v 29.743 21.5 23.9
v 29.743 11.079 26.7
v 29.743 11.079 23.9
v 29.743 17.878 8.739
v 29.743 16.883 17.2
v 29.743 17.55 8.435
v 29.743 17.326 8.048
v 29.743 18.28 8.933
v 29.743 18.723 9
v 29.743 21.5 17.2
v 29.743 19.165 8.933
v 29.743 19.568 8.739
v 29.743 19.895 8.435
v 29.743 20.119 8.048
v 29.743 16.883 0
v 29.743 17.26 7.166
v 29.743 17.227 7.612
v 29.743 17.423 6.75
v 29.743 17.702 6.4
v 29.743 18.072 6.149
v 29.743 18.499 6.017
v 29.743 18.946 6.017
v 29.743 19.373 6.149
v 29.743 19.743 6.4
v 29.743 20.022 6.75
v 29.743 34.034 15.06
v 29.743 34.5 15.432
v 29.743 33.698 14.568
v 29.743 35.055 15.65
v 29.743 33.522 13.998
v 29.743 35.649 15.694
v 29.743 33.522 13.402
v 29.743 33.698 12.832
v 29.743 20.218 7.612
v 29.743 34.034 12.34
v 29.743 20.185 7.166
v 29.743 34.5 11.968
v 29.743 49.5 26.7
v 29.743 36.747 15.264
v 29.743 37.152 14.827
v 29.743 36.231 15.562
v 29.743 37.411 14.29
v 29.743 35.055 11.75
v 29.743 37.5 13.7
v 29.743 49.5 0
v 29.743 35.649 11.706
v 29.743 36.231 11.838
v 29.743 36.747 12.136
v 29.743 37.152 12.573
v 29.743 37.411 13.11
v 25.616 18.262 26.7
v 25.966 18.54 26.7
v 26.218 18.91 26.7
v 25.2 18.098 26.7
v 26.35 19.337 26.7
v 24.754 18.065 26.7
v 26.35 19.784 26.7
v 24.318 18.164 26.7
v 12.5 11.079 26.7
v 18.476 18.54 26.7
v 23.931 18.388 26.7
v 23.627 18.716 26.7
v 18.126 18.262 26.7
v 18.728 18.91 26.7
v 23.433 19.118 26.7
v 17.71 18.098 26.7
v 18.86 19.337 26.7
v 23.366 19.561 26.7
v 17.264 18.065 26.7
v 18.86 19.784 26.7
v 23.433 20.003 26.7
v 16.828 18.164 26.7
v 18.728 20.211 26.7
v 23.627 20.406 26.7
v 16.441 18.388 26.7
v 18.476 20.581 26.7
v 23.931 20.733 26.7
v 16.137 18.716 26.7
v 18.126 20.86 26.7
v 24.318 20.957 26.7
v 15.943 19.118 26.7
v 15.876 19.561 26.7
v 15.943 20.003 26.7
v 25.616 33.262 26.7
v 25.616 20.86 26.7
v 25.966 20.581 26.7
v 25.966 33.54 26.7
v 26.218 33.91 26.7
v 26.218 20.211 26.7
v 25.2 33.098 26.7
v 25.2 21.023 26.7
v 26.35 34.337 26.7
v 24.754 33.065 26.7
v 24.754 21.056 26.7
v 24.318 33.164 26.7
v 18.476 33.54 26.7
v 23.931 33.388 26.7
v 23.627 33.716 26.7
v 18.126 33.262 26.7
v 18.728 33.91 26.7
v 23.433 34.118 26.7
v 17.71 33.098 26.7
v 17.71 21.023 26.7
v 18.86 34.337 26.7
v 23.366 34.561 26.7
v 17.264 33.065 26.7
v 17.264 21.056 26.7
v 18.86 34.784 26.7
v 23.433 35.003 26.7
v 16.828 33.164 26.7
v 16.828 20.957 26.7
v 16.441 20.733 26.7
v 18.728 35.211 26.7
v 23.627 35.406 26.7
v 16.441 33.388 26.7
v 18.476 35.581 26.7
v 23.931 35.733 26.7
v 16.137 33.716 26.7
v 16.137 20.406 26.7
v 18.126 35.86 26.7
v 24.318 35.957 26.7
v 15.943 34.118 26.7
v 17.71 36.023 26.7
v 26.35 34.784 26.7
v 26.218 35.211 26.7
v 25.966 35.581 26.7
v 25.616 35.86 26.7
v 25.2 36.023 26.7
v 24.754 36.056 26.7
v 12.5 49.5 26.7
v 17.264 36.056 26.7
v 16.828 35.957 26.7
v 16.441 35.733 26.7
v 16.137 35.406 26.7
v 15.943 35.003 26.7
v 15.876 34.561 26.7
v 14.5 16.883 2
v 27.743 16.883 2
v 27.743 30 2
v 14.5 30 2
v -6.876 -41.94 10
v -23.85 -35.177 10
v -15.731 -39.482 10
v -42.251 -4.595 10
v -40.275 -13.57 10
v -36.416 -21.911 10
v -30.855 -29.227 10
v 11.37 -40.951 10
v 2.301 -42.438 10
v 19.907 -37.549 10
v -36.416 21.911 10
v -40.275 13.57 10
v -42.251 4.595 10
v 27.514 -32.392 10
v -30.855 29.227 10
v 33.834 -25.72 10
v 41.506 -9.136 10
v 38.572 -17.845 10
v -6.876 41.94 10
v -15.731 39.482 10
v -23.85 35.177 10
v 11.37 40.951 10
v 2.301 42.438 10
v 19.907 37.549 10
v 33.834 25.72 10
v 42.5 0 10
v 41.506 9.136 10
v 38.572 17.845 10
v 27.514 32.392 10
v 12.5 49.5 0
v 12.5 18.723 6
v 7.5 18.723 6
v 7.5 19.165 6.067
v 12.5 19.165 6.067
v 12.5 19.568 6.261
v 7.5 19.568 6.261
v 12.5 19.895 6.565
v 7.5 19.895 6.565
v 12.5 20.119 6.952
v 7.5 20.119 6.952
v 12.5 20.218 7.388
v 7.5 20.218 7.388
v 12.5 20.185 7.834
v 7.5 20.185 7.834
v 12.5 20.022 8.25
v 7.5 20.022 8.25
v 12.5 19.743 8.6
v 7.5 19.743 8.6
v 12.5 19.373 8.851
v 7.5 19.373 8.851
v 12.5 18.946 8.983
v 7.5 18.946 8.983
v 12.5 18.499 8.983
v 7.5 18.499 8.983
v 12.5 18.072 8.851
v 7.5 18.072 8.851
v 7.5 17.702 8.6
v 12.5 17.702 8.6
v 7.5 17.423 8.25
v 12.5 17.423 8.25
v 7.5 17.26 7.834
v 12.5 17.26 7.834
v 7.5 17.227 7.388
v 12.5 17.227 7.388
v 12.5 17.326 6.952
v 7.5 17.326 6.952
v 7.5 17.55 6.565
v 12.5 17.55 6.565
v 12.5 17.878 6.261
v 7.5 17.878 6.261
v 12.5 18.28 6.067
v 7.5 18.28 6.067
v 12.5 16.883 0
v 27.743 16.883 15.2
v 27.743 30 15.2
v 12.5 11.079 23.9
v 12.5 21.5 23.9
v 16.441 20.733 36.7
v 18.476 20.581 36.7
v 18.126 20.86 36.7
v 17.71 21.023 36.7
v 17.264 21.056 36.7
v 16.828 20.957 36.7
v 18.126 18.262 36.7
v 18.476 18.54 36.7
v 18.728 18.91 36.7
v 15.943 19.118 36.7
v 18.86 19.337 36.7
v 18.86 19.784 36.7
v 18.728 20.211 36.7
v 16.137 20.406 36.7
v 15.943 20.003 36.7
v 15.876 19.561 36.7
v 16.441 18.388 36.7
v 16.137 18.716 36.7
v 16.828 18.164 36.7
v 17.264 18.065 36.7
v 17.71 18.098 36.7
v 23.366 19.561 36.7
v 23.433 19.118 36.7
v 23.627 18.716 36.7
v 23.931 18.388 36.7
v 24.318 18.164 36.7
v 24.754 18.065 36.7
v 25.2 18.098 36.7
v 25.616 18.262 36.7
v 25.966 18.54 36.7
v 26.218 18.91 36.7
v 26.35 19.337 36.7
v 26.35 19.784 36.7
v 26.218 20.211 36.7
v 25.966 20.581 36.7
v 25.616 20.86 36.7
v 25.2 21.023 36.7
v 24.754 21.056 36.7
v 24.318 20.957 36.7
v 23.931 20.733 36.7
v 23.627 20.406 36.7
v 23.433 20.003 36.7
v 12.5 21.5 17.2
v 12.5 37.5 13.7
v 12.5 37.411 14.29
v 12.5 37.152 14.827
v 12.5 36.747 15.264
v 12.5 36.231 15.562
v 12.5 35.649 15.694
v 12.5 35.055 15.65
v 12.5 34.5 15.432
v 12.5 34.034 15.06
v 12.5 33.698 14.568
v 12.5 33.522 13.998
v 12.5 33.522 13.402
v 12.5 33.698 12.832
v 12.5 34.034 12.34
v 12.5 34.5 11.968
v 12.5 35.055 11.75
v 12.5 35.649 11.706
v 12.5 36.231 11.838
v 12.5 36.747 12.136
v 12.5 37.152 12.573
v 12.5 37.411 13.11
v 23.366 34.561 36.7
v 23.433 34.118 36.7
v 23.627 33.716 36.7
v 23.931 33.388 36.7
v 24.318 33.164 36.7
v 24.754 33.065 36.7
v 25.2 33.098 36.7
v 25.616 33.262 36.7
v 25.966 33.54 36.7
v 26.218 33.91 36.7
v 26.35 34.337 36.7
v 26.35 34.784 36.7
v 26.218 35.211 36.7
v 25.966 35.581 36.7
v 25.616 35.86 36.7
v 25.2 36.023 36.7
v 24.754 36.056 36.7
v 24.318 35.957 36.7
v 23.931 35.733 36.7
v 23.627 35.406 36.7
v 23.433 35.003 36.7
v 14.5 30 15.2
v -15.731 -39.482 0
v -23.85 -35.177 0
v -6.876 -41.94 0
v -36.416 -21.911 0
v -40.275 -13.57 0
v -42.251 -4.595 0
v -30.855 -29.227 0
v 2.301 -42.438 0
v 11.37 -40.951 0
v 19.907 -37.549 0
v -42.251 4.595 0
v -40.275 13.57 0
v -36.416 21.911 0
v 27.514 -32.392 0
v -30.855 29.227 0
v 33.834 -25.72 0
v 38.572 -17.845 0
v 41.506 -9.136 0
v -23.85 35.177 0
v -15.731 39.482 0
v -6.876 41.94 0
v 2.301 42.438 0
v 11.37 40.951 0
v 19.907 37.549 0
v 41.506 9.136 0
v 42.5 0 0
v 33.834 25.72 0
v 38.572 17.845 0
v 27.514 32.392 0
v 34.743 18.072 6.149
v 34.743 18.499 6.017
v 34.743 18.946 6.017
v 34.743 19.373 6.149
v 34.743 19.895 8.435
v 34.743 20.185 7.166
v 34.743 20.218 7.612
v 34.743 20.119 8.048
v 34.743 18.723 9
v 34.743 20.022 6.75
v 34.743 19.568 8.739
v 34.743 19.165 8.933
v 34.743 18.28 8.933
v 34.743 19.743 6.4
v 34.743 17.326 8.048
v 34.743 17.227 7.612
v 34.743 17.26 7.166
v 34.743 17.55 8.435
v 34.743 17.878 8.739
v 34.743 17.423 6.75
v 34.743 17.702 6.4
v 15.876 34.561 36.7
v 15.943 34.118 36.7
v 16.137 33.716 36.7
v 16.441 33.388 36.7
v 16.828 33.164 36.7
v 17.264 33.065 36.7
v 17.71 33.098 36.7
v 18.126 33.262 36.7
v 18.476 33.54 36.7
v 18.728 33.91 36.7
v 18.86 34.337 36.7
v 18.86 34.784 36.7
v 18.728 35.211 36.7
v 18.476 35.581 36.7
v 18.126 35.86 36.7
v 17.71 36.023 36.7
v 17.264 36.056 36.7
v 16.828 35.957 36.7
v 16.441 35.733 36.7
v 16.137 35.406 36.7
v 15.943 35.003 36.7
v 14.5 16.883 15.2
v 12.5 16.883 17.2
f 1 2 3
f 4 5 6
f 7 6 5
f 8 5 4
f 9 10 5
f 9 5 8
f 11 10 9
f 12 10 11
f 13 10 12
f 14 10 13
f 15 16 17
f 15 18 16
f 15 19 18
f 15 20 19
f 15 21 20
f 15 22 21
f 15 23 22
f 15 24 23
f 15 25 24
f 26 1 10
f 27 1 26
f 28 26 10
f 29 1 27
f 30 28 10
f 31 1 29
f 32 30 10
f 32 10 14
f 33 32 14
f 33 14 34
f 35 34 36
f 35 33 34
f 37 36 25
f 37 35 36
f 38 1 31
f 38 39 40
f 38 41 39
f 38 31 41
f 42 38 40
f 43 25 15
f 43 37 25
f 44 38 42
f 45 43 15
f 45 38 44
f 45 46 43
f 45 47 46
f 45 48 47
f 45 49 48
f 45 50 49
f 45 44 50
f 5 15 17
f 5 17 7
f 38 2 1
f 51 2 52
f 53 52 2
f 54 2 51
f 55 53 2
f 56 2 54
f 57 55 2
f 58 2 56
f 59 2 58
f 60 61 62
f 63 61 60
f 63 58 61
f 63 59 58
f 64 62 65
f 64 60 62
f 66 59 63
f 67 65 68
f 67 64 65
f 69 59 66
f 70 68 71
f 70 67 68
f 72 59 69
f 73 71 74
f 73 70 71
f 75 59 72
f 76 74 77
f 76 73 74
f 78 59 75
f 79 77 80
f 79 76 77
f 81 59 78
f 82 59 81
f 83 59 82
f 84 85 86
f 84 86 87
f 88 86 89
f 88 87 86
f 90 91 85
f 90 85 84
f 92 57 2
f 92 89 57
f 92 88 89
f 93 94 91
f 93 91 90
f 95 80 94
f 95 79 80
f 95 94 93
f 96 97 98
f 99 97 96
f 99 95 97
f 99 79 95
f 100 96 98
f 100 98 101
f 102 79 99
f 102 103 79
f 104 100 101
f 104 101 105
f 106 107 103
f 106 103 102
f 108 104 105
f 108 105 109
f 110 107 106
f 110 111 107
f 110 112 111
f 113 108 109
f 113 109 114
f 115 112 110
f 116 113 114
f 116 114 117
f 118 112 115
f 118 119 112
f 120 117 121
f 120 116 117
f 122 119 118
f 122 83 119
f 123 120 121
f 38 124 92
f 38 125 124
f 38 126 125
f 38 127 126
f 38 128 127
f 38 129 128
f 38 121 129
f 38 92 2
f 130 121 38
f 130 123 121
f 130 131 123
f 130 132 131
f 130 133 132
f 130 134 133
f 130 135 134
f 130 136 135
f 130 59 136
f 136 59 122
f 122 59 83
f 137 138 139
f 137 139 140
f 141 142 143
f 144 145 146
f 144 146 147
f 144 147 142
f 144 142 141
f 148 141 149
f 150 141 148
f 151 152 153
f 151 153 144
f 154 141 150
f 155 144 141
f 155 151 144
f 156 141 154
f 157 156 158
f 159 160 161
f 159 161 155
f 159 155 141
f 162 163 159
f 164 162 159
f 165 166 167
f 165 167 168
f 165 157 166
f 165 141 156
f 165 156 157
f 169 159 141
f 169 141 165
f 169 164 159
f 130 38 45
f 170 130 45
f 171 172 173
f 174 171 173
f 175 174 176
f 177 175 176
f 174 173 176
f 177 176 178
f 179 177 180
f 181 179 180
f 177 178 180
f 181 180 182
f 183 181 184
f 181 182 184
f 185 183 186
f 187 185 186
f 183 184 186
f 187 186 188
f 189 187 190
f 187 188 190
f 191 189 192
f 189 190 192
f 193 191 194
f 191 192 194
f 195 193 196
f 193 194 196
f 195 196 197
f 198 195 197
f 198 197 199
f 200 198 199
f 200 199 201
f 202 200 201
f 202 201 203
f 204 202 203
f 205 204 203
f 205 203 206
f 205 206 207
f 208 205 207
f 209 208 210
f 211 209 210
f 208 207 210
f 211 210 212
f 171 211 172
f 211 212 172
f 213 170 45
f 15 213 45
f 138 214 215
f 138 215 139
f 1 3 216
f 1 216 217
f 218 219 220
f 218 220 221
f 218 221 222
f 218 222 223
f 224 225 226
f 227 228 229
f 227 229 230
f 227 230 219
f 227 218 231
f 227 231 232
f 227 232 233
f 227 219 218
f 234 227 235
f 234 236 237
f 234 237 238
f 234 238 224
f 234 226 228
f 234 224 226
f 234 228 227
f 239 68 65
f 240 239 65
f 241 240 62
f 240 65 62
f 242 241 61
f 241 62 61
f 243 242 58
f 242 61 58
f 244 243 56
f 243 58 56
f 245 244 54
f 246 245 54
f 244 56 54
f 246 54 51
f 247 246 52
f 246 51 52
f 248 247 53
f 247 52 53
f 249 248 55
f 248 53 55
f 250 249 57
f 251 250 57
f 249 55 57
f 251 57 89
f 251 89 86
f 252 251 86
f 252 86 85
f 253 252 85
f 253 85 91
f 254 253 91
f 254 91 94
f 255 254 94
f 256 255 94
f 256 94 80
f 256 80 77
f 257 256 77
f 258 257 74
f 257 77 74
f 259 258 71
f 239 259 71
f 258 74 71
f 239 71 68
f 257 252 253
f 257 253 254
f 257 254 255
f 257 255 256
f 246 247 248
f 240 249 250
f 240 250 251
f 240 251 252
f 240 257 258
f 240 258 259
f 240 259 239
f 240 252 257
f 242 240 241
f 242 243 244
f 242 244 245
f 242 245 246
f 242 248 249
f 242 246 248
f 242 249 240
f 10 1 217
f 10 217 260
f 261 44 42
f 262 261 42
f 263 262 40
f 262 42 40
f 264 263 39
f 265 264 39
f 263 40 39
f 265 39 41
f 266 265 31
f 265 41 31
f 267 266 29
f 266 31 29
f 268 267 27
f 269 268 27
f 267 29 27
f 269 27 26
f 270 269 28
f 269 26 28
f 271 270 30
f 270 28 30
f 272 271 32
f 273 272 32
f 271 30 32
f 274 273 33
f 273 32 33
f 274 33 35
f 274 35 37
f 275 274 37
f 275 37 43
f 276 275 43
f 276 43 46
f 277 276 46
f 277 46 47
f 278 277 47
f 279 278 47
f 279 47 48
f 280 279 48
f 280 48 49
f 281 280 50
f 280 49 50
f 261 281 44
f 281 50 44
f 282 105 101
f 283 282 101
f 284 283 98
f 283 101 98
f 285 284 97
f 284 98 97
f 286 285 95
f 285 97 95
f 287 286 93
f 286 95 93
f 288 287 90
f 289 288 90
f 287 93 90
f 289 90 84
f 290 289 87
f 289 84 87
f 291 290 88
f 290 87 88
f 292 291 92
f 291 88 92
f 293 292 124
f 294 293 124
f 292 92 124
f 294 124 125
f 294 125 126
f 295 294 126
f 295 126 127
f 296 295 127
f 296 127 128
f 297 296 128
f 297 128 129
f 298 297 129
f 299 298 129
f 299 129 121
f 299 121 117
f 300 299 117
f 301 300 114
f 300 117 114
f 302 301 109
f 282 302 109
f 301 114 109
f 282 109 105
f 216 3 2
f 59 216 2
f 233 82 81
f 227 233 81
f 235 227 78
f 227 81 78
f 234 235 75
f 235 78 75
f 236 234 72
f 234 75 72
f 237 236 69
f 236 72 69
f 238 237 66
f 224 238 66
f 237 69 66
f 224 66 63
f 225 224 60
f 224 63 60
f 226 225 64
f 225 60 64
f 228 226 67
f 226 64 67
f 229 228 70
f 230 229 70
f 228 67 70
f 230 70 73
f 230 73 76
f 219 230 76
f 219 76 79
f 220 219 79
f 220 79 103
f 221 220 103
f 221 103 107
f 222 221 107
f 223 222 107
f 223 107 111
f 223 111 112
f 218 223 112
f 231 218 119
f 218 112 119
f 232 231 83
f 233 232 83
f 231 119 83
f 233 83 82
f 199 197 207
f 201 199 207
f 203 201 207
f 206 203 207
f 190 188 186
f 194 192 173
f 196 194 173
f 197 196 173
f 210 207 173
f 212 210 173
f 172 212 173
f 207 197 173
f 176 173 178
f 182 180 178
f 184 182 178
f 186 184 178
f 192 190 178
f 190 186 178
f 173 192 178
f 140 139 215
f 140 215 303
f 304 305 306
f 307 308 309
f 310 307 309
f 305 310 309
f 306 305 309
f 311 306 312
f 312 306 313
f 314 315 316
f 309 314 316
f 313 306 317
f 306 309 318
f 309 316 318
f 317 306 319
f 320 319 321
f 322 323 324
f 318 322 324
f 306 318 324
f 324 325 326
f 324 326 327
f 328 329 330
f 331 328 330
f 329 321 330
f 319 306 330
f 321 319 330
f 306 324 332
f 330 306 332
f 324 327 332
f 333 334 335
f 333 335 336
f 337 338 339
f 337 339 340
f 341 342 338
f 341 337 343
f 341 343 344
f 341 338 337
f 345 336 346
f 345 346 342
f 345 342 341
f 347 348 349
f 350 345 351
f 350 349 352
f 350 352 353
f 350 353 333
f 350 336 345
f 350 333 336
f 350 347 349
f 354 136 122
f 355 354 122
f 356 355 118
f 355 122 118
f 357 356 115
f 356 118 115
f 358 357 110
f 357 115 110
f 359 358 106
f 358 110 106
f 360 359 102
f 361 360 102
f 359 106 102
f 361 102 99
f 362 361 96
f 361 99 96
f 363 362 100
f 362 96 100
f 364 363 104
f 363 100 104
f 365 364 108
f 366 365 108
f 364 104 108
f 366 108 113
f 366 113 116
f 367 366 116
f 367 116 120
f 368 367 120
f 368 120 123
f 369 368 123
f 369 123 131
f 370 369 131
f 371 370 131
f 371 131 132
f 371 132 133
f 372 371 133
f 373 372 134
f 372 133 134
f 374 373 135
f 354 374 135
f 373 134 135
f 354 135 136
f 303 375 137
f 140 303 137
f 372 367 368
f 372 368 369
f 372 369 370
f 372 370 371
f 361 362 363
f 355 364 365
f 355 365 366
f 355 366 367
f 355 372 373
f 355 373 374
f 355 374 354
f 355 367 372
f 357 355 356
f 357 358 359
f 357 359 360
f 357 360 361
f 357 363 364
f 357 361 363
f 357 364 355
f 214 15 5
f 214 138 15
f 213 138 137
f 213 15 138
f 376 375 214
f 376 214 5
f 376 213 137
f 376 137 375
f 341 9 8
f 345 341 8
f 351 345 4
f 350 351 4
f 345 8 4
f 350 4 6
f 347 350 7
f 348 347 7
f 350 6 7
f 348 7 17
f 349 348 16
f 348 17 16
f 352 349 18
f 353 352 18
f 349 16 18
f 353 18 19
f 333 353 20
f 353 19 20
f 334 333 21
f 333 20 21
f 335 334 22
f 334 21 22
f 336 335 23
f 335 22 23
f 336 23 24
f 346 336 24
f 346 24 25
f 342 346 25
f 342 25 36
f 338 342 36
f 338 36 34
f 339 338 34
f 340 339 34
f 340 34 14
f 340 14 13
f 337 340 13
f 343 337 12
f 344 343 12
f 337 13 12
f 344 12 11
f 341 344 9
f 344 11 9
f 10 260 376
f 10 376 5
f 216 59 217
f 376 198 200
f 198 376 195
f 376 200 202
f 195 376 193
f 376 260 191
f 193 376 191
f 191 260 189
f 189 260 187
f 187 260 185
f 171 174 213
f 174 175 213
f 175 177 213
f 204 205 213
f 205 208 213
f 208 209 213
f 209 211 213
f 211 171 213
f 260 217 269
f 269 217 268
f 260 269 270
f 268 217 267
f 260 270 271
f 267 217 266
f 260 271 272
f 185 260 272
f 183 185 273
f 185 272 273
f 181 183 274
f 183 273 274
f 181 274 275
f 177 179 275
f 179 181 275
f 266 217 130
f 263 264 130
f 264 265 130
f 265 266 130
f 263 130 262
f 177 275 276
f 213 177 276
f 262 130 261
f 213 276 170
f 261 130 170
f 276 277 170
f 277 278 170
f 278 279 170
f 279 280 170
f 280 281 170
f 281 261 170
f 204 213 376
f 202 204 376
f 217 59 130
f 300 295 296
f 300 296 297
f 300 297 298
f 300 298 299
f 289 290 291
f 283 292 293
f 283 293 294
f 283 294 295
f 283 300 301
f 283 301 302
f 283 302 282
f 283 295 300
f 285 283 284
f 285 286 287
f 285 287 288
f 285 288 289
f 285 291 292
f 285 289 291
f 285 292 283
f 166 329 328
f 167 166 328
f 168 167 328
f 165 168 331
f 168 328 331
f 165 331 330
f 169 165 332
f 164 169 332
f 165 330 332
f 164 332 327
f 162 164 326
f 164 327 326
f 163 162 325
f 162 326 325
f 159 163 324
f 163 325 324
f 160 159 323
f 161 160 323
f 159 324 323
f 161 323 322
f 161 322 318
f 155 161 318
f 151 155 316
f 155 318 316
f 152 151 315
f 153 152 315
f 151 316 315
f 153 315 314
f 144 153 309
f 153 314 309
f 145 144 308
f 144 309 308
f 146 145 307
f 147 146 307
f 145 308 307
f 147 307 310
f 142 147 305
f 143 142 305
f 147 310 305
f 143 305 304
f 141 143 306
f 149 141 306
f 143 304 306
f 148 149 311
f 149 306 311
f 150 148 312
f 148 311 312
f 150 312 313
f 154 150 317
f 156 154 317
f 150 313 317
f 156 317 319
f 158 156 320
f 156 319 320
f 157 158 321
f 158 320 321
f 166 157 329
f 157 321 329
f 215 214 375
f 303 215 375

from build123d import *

# Parameters (mm, degrees)
SKETCH4_R               = 42.5
BASE_DEPTH              = 10
SKETCH5_W               = 17.242861366
SKETCH5_H               = 43.5
BOSS_EXTRUDE1_DEPTH     = 17.2
SKETCH6_W               = 13.242861366
SKETCH6_H               = 13.2
CUT_EXTRUDE1_DEPTH      = 24
SKETCH9_R               = 1.5
BOSS_EXTRUDE2_DEPTH     = 5
WRAP1_START             = -22.242861366
WRAP1_OUTLINE_R         = 1.5
WRAP1_DEPTH             = 5
SKETCH14_W              = 14
SKETCH14_H              = 28
BOSS_EXTRUDE4_DEPTH     = 17.242861366
SKETCH16_R              = 14
CUT_EXTRUDE2_DEPTH      = 17.242861366
CUT_EXTRUDE4_REACH      = 108.036
SKETCH19_W              = 17.242861366
SKETCH19_H              = 4.5
CUT_EXTRUDE6_REACH      = 71.795
CUT_EXTRUDE6_END_RADIUS = 14
SKETCH22_W              = 17.242861366
SKETCH22_H              = 2.8
SKETCH23_R              = 2
CUT_EXTRUDE7_DEPTH      = 17.242861366
CUT_EXTRUDE8_REACH      = 80.665
SKETCH24_W              = 17.2
SKETCH24_H              = 5.3
CUT_EXTRUDE9_REACH      = 80.665
SKETCH25_W              = 27.034559723
SKETCH25_H              = 9.24407526
SKETCH26_W              = 2.8
SKETCH26_H              = 10.42050917
BOSS_EXTRUDE5_DEPTH     = 17.242861366
SKETCH27_R              = 1.5
BOSS_EXTRUDE6_DEPTH     = 10


# Read off the part's stored shape, not the designer's step: Wrap1
with BuildPart() as part:
    # Sketch4 → base (new body)
    with BuildSketch(Plane.XY):
        Circle(SKETCH4_R)
    extrude(amount=BASE_DEPTH)


with BuildPart() as body_2:
    # Sketch5 → Boss-Extrude1 (new body)
    with BuildSketch(Plane.XY):
        with Locations((21.121430683, 27.75)):
            Rectangle(SKETCH5_W, SKETCH5_H)
    extrude(amount=BOSS_EXTRUDE1_DEPTH)

    # Sketch6 → Cut-Extrude1 (cut)
    with BuildSketch(Plane(origin=(0, 6, 0), x_dir=(-1, 0, 0), z_dir=(0, -1, 0))):
        with Locations((-21.121430683, -8.6)):
            Rectangle(SKETCH6_W, SKETCH6_H)
    extrude(amount=-CUT_EXTRUDE1_DEPTH, mode=Mode.SUBTRACT)

    # Sketch9 → Boss-Extrude2 (add)
    with BuildSketch(Plane(origin=(29.742861366, 0, 0), x_dir=(0, 0, -1), z_dir=(1, 0, 0))):
        with Locations(Location((-7.5, 18.722537456, 0), (0, 0, 180))):
            Circle(SKETCH9_R)
    extrude(amount=BOSS_EXTRUDE2_DEPTH)

    # Wrap1 outline → Wrap1 (add)
    with BuildSketch(Plane(origin=(29.742861366, 0, 0), x_dir=(0, 0, -1), z_dir=(1, 0, 0)).offset(WRAP1_START)):
        with Locations((-7.5, 18.722537456)):
            Circle(WRAP1_OUTLINE_R)
    extrude(amount=WRAP1_DEPTH)

    # Sketch14 → Boss-Extrude4 (add)
    with BuildSketch(Plane(origin=(29.742861366, 0, 0), x_dir=(0, 0, -1), z_dir=(1, 0, 0))):
        with Locations((-24.2, 35.5)):
            Rectangle(SKETCH14_W, SKETCH14_H)
    extrude(amount=-BOSS_EXTRUDE4_DEPTH)

    # Sketch16 → Cut-Extrude2 (cut)
    with BuildSketch(Plane(origin=(29.742861366, 0, 0), x_dir=(0, 0, -1), z_dir=(1, 0, 0))):
        with Locations((-31.2, 35.5)):
            Circle(SKETCH16_R)
    extrude(amount=-CUT_EXTRUDE2_DEPTH, mode=Mode.SUBTRACT)

    # Cut-Extrude4: up to this face of the body (flat: up to its plane)
    cut_extrude4_end = Plane(body_2.part.faces().sort_by_distance((21.121430683, 21.5, 24.2))[0])
    # Sketch19 → Cut-Extrude4 (cut, up to the picked face)
    with BuildSketch(Plane(origin=(0, 49.5, 0), x_dir=(1, 0, 0), z_dir=(0, 1, 0)), mode=Mode.PRIVATE) as cut_extrude4_sk1:
        with Locations((21.121430683, -28.95)):
            Rectangle(SKETCH19_W, SKETCH19_H)
    cut_extrude4_tool1 = split(extrude(cut_extrude4_sk1.sketch, amount=-CUT_EXTRUDE4_REACH, mode=Mode.PRIVATE), bisect_by=cut_extrude4_end, keep=Keep.BOTH, mode=Mode.PRIVATE)
    add(cut_extrude4_tool1.solids().sort_by(Axis((21.121431, 49.5, 28.95), (0, -1, 0)))[0], mode=Mode.SUBTRACT)

    # Cut-Extrude6: up to this cylinder (the profile starts outside it)
    cut_extrude6_end = Plane(origin=(21.121431, 35.5, 31.2), z_dir=(1, 0, 0)) * Cylinder(CUT_EXTRUDE6_END_RADIUS, 172.59, mode=Mode.PRIVATE)
    # Sketch22 → Cut-Extrude6 (cut, up to the surface)
    with BuildSketch(Plane(origin=(0, 6, 0), x_dir=(-1, 0, 0), z_dir=(0, -1, 0)), mode=Mode.PRIVATE) as cut_extrude6_sk1:
        with Locations((-21.121430683, -25.3)):
            Rectangle(SKETCH22_W, SKETCH22_H)
    cut_extrude6_tool1 = extrude(cut_extrude6_sk1.sketch, amount=-CUT_EXTRUDE6_REACH, mode=Mode.PRIVATE) - cut_extrude6_end
    add(cut_extrude6_tool1.solids().sort_by_distance((21.121431, 6, 25.3))[0], mode=Mode.SUBTRACT)

    # Sketch23 → Cut-Extrude7 (cut)
    with BuildSketch(Plane(origin=(29.742861366, 0, 0), x_dir=(0, 0, -1), z_dir=(1, 0, 0))):
        with Locations(Location((-13.7, 35.5, 0), (0, 0, 90))):
            Circle(SKETCH23_R)
    extrude(amount=-CUT_EXTRUDE7_DEPTH, mode=Mode.SUBTRACT)

    # Cut-Extrude8: up to this face of the body (flat: up to its plane)
    cut_extrude8_end = Plane(body_2.part.faces().sort_by_distance((29.742861366, 28.520960227, 9.624194882))[0])
    # Sketch24 → Cut-Extrude8 (cut, up to the picked face)
    with BuildSketch(Plane.ZY.offset(-12.5), mode=Mode.PRIVATE) as cut_extrude8_sk1:
        with Locations((8.6, 8.65)):
            Rectangle(SKETCH24_W, SKETCH24_H)
    cut_extrude8_tool1 = split(extrude(cut_extrude8_sk1.sketch, amount=-CUT_EXTRUDE8_REACH, mode=Mode.PRIVATE), bisect_by=cut_extrude8_end, keep=Keep.BOTH, mode=Mode.PRIVATE)
    add(cut_extrude8_tool1.solids().sort_by(Axis((12.5, 8.65, 8.6), (1, 0, 0)))[0], mode=Mode.SUBTRACT)

    # Cut-Extrude9: up to this face of the body (flat: up to its plane)
    cut_extrude9_end = Plane(body_2.part.faces().sort_by_distance((29.742861366, 31.052365507, 9.754669319))[0])
    # Sketch25 → Cut-Extrude9 (cut, up to the picked face)
    with BuildSketch(Plane.ZY.offset(-12.5), mode=Mode.PRIVATE) as cut_extrude9_sk1:
        with Locations((8.495407017, 12.260670009)):
            Rectangle(SKETCH25_W, SKETCH25_H)
    cut_extrude9_tool1 = split(extrude(cut_extrude9_sk1.sketch, amount=-CUT_EXTRUDE9_REACH, mode=Mode.PRIVATE), bisect_by=cut_extrude9_end, keep=Keep.BOTH, mode=Mode.PRIVATE)
    add(cut_extrude9_tool1.solids().sort_by(Axis((12.5, 12.26067, 8.495407), (1, 0, 0)))[0], mode=Mode.SUBTRACT)

    # Sketch26 → Boss-Extrude5 (add)
    with BuildSketch(Plane.ZY.offset(-12.5)):
        Polygon((16.229247073, 48.406672833), (17.2, 21.5), (23.9, 21.5), (26.7, 21.5), (26.7, 48.757073584), align=None)
        with Locations((25.3, 16.289745415)):
            Rectangle(SKETCH26_W, SKETCH26_H)
    extrude(amount=-BOSS_EXTRUDE5_DEPTH)

    # Sketch27 → Boss-Extrude6 (add)
    with BuildSketch(Plane.XY.offset(26.7)):
        with Locations(Location((24.866448866, 19.560624718, 0), (0, 0, 180))):
            Circle(SKETCH27_R)
        with Locations(Location((17.3764125, 19.560624718, 0), (0, 0, 180))):
            Circle(SKETCH27_R)
        with Locations(Location((24.866448866, 34.560624718, 0), (0, 0, 180))):
            Circle(SKETCH27_R)
        with Locations(Location((17.3764125, 34.560624718, 0), (0, 0, 180))):
            Circle(SKETCH27_R)
    extrude(amount=BOSS_EXTRUDE6_DEPTH)


solid = Compound([part.part, body_2.part])
